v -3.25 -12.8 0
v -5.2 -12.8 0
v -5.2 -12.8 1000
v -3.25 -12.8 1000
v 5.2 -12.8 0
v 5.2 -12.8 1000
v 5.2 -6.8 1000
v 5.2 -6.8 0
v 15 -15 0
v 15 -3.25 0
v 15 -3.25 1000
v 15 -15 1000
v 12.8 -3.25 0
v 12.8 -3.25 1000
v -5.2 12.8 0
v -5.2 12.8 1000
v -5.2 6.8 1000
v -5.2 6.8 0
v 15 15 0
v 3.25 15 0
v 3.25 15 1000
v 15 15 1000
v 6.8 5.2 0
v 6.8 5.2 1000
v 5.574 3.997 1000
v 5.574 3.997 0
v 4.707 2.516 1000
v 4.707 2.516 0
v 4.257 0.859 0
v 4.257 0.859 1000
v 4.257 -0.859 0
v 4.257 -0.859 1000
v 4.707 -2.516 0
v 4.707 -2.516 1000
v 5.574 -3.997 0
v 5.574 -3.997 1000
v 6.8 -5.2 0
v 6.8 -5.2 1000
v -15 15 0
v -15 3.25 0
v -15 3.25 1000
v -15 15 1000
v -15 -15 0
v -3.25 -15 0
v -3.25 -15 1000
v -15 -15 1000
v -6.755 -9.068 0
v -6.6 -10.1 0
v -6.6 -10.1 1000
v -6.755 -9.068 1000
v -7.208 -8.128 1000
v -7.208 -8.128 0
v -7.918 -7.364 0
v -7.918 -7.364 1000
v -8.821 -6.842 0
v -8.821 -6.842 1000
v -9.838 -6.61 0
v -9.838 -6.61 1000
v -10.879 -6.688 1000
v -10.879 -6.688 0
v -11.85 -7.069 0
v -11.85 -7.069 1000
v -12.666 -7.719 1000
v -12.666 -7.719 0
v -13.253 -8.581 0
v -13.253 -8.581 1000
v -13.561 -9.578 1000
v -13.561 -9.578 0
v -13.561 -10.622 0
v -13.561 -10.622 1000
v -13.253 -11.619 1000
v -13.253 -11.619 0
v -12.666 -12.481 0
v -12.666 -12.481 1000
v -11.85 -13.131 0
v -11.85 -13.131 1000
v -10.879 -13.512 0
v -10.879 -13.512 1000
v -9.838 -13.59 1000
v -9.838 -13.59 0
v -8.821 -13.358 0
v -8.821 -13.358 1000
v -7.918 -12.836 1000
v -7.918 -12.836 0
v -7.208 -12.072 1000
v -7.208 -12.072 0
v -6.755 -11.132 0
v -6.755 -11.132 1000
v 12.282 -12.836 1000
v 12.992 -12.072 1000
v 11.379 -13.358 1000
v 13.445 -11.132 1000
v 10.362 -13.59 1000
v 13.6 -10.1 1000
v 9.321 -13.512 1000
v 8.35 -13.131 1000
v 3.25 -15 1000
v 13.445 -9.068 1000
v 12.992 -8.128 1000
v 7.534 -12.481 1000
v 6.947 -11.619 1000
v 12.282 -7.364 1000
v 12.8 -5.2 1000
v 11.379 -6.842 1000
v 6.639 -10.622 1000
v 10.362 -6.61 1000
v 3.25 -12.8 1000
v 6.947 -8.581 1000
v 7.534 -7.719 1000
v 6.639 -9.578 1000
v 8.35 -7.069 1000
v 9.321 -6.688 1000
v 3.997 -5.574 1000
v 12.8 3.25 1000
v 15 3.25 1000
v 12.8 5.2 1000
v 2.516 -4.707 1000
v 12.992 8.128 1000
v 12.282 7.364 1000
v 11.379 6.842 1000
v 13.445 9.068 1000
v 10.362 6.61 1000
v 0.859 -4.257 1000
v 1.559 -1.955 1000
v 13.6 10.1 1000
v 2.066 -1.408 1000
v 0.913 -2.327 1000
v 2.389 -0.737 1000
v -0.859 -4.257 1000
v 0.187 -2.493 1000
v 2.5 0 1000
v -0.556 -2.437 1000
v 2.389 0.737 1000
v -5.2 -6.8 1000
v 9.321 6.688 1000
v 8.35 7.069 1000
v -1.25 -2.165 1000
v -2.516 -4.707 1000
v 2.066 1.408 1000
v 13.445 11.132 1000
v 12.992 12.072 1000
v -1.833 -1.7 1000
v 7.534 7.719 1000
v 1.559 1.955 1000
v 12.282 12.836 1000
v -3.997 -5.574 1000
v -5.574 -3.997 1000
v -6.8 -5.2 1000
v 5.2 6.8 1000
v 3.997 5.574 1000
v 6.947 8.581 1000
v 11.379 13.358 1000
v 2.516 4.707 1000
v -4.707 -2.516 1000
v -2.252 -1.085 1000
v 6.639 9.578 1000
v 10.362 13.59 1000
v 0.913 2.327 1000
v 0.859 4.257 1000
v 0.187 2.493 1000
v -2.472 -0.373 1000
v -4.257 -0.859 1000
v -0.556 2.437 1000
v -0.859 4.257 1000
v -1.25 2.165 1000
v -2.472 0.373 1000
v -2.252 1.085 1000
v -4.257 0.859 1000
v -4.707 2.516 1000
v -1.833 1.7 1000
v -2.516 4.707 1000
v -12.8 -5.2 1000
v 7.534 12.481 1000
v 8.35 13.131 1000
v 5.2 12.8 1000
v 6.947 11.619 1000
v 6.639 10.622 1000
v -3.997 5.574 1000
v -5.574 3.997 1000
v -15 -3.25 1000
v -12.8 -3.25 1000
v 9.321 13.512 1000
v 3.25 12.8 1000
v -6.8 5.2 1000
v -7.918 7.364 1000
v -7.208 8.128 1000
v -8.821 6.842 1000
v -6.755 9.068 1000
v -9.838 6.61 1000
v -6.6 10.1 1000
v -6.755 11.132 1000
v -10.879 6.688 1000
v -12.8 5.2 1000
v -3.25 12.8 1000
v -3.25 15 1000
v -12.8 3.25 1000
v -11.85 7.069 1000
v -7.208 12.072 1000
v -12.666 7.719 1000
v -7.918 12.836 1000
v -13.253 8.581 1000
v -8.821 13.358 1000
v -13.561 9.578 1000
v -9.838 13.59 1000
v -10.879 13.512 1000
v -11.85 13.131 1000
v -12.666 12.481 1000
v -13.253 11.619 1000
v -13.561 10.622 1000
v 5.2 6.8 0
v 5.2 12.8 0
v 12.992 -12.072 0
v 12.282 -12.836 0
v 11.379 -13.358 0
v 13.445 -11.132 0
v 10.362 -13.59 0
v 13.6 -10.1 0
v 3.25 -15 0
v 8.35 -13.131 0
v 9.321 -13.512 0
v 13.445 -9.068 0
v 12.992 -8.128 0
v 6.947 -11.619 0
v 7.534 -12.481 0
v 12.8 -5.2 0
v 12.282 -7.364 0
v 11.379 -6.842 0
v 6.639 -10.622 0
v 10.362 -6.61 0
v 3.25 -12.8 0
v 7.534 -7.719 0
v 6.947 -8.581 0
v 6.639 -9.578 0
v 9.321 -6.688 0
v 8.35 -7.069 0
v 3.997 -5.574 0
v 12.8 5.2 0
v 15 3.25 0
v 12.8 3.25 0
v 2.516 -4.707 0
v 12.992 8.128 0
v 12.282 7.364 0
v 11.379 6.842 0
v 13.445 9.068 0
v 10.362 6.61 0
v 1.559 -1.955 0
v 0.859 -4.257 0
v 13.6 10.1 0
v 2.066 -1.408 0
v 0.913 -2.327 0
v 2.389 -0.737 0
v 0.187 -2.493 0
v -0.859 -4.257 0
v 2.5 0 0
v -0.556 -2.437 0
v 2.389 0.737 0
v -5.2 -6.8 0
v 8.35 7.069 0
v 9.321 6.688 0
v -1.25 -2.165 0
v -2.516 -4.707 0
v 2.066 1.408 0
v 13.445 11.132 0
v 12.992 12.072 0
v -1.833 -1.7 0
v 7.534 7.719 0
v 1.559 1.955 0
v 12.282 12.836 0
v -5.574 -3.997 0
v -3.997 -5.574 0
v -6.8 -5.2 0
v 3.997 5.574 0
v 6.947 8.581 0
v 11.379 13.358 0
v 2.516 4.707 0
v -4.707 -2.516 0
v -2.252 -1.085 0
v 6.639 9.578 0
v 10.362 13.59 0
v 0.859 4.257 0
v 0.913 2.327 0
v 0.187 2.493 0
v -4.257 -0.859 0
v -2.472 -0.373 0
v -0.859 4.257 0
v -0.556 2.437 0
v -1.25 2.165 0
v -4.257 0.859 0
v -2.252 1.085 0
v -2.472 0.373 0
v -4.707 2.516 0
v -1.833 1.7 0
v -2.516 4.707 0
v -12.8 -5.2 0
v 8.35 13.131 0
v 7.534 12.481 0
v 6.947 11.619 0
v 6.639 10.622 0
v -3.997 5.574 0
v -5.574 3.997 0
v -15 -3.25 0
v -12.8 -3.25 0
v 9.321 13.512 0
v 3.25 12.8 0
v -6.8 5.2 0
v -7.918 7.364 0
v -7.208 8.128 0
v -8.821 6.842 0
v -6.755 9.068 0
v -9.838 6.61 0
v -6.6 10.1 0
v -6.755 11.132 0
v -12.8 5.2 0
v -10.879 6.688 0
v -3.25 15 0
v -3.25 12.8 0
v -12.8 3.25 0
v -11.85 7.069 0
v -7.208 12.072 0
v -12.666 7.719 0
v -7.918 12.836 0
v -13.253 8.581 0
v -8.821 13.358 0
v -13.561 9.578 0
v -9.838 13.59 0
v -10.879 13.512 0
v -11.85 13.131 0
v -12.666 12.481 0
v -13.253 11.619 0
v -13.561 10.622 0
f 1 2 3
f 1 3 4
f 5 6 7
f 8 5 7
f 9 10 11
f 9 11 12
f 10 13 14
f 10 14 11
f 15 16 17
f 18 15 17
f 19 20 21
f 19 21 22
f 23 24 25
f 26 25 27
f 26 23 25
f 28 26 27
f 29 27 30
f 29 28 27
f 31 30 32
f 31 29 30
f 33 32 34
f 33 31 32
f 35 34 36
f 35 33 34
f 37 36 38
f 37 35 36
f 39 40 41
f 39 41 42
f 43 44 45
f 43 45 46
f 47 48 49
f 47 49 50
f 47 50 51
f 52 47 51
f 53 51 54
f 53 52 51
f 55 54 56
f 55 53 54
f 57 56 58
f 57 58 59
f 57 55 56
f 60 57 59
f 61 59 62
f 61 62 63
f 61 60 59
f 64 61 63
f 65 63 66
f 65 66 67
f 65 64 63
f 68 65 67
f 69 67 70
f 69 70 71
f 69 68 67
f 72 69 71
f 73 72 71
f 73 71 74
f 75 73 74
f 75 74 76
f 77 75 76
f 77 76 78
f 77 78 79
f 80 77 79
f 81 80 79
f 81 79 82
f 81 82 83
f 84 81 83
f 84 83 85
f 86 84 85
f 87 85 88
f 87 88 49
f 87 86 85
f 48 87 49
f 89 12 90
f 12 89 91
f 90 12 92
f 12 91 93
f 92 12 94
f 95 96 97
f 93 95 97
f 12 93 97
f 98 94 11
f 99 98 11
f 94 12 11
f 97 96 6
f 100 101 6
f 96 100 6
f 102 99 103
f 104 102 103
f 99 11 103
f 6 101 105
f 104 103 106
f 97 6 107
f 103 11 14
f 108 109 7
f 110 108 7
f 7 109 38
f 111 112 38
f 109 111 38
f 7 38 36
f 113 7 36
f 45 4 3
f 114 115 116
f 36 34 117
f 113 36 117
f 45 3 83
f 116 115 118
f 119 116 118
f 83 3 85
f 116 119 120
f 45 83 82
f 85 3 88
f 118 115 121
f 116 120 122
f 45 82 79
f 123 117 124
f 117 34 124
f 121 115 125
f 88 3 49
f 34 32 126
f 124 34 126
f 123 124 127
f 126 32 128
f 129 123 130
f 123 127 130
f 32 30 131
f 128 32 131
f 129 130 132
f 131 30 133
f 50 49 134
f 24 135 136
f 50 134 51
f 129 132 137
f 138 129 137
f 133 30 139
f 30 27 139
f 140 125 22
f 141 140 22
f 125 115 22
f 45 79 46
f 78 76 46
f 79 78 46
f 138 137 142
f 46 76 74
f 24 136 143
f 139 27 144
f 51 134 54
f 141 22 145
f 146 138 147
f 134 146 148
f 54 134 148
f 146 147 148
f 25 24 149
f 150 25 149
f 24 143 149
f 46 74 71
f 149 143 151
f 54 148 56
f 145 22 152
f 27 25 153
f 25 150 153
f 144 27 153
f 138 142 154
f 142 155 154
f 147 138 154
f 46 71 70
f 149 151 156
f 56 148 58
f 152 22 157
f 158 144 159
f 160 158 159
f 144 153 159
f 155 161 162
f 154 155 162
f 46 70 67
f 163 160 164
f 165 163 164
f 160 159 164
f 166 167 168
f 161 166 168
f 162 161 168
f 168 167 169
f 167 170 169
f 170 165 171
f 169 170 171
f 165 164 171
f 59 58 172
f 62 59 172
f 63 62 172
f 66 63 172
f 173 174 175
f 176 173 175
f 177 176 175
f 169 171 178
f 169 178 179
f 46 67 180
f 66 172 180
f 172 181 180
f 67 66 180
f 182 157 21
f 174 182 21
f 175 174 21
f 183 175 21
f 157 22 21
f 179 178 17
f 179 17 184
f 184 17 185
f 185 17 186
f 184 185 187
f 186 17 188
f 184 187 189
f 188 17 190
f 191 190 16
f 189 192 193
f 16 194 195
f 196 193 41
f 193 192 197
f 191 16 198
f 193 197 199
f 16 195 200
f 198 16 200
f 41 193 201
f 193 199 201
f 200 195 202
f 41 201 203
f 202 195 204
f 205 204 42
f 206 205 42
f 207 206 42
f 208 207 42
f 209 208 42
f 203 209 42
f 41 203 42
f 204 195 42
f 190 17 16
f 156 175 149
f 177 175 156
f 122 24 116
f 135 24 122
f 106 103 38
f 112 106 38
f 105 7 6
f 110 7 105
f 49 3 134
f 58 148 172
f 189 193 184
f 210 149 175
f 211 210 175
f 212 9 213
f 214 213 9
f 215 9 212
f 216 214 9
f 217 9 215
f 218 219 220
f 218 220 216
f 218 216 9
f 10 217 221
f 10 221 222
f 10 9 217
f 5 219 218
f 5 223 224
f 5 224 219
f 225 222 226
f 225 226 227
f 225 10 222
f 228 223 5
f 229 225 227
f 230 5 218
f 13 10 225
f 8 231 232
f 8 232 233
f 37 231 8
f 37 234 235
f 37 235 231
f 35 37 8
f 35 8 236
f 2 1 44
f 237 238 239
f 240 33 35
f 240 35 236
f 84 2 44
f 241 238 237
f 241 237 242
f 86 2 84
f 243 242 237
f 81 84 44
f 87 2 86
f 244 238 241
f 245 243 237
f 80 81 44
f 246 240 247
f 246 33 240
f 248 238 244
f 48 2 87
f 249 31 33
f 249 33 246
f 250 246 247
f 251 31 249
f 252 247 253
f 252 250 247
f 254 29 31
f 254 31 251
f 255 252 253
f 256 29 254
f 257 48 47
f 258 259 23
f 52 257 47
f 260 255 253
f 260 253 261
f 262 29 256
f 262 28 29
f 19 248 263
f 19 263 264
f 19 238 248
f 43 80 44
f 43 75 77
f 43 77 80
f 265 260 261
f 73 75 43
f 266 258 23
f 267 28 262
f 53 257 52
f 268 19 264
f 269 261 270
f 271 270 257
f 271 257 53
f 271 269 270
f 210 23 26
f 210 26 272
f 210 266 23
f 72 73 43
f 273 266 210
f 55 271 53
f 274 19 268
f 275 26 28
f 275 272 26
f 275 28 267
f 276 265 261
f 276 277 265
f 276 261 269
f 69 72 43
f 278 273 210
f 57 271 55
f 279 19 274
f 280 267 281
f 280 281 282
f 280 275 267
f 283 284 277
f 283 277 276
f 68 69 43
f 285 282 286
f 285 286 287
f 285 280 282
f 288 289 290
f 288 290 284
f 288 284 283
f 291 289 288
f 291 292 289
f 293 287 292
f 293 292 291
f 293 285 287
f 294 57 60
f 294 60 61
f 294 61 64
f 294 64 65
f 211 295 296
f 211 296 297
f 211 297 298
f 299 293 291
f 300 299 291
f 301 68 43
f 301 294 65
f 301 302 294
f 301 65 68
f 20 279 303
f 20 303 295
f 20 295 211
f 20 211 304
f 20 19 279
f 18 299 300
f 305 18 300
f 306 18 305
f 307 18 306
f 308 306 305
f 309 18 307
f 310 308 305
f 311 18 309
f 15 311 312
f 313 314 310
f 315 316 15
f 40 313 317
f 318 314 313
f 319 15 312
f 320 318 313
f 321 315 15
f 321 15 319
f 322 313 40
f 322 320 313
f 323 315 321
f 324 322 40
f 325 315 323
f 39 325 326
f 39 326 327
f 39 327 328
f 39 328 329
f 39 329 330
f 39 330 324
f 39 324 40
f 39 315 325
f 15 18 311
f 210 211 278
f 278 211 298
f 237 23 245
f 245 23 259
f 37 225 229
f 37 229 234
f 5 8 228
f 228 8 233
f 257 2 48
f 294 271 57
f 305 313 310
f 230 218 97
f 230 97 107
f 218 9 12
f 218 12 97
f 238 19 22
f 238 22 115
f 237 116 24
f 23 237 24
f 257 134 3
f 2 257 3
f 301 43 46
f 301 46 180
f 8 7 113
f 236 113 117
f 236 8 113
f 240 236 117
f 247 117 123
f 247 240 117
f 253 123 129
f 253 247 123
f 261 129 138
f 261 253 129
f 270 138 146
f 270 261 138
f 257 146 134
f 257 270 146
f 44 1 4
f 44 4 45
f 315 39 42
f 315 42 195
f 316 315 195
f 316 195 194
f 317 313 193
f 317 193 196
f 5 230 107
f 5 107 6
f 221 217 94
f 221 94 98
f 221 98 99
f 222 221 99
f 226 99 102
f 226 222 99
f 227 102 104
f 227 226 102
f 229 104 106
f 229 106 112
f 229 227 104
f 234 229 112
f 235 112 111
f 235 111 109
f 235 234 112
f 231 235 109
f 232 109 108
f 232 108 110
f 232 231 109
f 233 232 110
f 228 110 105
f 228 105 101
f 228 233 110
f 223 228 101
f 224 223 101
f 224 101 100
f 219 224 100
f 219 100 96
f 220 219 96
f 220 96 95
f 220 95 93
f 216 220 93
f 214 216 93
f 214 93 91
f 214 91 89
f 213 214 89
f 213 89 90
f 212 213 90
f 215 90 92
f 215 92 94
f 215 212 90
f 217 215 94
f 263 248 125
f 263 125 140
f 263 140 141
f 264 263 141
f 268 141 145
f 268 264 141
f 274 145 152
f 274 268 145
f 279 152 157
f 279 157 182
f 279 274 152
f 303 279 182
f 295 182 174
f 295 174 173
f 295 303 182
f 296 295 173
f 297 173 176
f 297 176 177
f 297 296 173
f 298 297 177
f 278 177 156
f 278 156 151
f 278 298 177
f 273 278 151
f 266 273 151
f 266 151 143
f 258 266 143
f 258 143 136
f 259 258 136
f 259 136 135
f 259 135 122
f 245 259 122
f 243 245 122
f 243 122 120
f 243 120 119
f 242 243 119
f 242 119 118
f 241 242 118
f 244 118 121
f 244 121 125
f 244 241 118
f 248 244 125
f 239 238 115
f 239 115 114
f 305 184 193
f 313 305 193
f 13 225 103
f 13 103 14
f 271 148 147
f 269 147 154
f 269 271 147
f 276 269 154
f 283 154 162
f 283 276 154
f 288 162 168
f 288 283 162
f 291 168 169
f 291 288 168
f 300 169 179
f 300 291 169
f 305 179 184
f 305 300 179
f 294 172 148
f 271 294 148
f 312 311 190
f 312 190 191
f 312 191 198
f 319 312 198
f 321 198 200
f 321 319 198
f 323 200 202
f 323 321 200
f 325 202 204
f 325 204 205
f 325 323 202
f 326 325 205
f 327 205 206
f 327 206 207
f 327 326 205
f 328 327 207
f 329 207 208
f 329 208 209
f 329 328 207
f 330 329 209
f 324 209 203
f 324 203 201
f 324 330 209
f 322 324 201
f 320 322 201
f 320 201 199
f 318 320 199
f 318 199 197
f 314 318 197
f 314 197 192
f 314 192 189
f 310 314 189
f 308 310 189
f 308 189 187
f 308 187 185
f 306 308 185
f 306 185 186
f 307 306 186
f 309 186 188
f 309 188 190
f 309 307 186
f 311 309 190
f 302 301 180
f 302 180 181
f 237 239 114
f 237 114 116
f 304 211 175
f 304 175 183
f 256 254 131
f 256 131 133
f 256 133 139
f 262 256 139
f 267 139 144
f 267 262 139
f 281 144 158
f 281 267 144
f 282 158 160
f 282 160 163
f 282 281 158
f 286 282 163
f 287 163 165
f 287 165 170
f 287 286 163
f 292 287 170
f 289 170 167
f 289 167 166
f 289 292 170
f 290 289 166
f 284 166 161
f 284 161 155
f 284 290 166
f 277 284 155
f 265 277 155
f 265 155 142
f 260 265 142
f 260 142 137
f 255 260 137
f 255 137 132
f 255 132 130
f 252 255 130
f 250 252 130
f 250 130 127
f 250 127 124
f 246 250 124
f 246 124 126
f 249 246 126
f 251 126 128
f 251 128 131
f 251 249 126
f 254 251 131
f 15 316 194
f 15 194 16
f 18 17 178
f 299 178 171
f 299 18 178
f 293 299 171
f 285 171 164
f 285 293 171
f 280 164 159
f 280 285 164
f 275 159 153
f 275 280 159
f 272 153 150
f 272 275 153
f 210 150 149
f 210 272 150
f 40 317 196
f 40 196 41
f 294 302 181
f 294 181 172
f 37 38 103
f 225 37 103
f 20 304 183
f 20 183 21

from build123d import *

# Parameters (mm, degrees)
SKETCH_1_R      = 3.5
SKETCH_1_R_2    = 2.5
EXTRUDE_1_DEPTH = 1000


with BuildPart() as part:
    # Эскиз1 → Бобышка-Вытянуть1 (new body)
    with BuildSketch(Plane.XY):
        with BuildLine():
            Line((-15, 5.2), (-15, 15))
            Line((-15, 15), (-5.2, 15))
            Line((-5.2, 15), (-3.25, 15))
            Line((-3.25, 15), (-3.25, 12.8))
            Line((-3.25, 12.8), (-5.2, 12.8))
            Line((-5.2, 12.8), (-5.2, 6.8))
            ThreePointArc((-5.2, 6.8), (0, 4.2), (5.2, 6.8))
            Line((5.2, 6.8), (5.2, 12.8))
            Line((5.2, 12.8), (3.25, 12.8))
            Line((3.25, 12.8), (3.25, 15))
            Line((3.25, 15), (5.2, 15))
            Line((5.2, 15), (15, 15))
            Line((15, 15), (15, 5.2))
            Line((15, 5.2), (15, 3.25))
            Line((15, 3.25), (12.8, 3.25))
            Line((12.8, 3.25), (12.8, 5.2))
            Line((12.8, 5.2), (6.8, 5.2))
            ThreePointArc((6.8, 5.2), (4.2, 0), (6.8, -5.2))
            Line((6.8, -5.2), (12.8, -5.2))
            Line((12.8, -5.2), (12.8, -3.25))
            Line((12.8, -3.25), (15, -3.25))
            Line((15, -3.25), (15, -5.2))
            Line((15, -5.2), (15, -15))
            Line((15, -15), (5.2, -15))
            Line((5.2, -15), (3.25, -15))
            Line((3.25, -15), (3.25, -12.8))
            Line((3.25, -12.8), (5.2, -12.8))
            Line((5.2, -12.8), (5.2, -6.8))
            ThreePointArc((5.2, -6.8), (0, -4.2), (-5.2, -6.8))
            Line((-5.2, -6.8), (-5.2, -12.8))
            Line((-5.2, -12.8), (-3.25, -12.8))
            Line((-3.25, -12.8), (-3.25, -15))
            Line((-3.25, -15), (-5.2, -15))
            Line((-5.2, -15), (-15, -15))
            Line((-15, -15), (-15, -5.2))
            Line((-15, -5.2), (-15, -3.25))
            Line((-15, -3.25), (-12.8, -3.25))
            Line((-12.8, -3.25), (-12.8, -5.2))
            Line((-12.8, -5.2), (-6.8, -5.2))
            ThreePointArc((-6.8, -5.2), (-4.2, 0), (-6.8, 5.2))
            Line((-6.8, 5.2), (-12.8, 5.2))
            Line((-12.8, 5.2), (-12.8, 3.25))
            Line((-12.8, 3.25), (-15, 3.25))
            Line((-15, 3.25), (-15, 5.2))
        make_face()
        with Locations((-10.1, 10.1)):
            Circle(SKETCH_1_R, mode=Mode.SUBTRACT)
        with Locations((10.1, 10.1)):
            Circle(SKETCH_1_R, mode=Mode.SUBTRACT)
        with Locations((-10.1, -10.1)):
            Circle(SKETCH_1_R, mode=Mode.SUBTRACT)
        with Locations((10.1, -10.1)):
            Circle(SKETCH_1_R, mode=Mode.SUBTRACT)
        Circle(SKETCH_1_R_2, mode=Mode.SUBTRACT)
    extrude(amount=EXTRUDE_1_DEPTH)


solid = part.part
